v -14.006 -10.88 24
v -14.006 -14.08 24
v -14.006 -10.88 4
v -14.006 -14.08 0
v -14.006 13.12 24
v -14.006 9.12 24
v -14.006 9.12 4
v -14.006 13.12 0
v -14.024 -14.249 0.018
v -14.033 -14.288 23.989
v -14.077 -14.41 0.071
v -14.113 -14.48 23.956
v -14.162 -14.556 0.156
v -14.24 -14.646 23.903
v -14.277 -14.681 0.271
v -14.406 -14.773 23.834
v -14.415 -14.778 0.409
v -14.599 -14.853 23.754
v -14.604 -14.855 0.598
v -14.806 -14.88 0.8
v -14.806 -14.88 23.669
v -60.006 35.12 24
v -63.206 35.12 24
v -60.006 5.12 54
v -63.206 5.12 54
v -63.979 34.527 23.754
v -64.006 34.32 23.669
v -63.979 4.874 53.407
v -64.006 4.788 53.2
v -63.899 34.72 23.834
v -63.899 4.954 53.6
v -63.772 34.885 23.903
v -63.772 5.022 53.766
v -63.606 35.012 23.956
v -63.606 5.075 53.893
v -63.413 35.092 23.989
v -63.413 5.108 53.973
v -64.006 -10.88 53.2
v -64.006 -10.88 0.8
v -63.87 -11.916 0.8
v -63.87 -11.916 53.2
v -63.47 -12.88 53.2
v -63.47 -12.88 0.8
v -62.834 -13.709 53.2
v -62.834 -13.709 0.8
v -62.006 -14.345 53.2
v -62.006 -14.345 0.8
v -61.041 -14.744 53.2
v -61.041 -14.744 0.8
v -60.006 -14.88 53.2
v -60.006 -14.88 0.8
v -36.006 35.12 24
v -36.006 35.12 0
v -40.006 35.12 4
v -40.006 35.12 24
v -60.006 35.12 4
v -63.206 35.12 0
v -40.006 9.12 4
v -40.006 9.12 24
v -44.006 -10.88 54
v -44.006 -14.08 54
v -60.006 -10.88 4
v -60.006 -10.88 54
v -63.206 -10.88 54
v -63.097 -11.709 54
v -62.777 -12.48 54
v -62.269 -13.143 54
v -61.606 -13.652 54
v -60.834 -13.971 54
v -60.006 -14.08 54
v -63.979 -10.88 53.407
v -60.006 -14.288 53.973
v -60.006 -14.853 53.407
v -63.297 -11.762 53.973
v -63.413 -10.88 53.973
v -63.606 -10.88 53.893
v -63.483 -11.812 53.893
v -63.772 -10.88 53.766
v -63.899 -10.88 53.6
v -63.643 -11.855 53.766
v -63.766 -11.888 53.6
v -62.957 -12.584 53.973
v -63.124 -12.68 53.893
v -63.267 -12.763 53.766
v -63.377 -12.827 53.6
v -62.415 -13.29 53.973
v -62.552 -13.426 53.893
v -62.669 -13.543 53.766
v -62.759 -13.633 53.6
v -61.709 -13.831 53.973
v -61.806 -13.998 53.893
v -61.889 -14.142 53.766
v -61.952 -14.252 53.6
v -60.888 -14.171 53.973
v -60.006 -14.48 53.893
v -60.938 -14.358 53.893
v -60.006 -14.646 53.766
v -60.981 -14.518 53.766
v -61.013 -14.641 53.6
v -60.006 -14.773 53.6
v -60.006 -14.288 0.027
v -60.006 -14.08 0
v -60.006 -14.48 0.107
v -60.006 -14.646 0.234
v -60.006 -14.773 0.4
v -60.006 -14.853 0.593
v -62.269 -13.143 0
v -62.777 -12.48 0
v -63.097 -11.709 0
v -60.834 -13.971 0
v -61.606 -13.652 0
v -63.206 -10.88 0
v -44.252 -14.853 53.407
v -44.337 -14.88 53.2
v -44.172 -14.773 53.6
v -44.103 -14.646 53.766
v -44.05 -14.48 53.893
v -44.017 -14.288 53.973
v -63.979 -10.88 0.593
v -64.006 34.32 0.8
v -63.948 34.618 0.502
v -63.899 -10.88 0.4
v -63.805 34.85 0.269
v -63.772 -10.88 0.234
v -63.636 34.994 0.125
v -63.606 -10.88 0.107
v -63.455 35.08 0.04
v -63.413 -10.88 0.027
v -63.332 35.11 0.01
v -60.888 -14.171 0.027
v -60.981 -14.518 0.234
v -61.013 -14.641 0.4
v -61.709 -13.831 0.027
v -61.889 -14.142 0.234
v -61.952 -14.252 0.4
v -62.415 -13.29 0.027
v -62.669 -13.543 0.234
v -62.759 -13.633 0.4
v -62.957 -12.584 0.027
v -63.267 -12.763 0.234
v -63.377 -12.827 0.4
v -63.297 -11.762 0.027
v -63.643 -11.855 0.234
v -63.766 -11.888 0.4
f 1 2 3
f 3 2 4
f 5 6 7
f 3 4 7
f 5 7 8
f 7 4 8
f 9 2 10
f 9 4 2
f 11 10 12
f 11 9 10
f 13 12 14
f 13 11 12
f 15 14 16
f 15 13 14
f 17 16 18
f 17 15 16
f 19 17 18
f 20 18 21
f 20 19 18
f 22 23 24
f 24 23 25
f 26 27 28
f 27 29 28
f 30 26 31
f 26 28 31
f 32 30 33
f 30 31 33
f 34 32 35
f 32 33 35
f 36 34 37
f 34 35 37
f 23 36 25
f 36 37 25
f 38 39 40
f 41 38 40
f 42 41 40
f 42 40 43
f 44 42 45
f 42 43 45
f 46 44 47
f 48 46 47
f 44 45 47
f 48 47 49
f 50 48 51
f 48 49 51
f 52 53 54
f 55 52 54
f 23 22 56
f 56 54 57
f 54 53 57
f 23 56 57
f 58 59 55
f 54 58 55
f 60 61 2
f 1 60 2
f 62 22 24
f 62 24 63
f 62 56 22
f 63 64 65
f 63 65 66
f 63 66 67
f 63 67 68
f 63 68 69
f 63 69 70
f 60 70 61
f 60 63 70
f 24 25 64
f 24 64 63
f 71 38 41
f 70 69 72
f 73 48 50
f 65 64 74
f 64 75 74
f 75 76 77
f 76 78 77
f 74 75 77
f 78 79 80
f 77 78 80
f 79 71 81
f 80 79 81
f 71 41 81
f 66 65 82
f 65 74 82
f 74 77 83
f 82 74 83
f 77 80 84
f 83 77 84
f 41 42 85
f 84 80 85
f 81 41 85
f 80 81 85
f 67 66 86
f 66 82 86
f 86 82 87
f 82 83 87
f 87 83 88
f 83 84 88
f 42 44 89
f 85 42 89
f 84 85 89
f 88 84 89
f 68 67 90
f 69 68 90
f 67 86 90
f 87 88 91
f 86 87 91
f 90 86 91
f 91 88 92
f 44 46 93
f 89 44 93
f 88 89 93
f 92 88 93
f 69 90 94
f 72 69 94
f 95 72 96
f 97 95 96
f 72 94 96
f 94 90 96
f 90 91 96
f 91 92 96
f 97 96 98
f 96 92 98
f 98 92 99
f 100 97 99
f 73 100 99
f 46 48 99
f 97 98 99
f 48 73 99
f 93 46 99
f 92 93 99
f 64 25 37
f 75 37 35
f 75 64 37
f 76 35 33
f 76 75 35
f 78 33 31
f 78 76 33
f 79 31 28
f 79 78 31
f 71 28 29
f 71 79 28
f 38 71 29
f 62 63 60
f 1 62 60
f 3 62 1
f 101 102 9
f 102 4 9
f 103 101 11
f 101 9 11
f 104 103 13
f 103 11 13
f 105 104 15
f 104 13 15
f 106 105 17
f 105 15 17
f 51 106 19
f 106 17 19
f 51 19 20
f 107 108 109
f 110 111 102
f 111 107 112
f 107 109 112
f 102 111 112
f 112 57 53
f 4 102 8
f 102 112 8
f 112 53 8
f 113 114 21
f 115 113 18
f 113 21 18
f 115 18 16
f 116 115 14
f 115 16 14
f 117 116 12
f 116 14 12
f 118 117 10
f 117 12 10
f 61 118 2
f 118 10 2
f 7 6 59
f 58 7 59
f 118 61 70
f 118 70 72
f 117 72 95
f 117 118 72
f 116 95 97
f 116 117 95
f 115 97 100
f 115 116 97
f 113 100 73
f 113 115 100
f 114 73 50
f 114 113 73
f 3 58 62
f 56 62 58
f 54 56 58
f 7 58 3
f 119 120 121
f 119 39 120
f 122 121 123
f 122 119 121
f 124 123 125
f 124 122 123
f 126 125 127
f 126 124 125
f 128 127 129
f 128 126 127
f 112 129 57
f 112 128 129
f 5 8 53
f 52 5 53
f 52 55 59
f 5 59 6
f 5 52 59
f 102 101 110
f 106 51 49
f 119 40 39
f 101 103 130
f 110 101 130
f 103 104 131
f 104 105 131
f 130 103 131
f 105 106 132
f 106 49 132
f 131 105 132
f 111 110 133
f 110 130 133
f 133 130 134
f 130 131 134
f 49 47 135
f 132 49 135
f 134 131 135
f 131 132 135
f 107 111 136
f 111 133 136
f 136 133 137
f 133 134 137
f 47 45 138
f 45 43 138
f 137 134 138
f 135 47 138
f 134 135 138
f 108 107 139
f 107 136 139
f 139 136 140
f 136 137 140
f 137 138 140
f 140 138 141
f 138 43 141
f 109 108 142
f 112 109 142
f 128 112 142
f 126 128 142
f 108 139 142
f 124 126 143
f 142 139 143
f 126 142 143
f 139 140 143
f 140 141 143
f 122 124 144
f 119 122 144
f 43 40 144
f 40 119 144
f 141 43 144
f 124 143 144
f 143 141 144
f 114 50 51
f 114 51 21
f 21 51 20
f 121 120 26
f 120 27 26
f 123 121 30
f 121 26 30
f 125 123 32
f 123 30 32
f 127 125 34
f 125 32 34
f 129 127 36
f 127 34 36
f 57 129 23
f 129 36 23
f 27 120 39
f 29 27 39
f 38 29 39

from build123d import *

# Parameters (mm, degrees)
F1_DEPTH     = 24
F3_DEPTH     = 20
F4_DEPTH     = 30
F6_DEPTH     = 25
F8_DEPTH     = 25
F9_R         = 0.8
F10_T1_DEPTH = 54
F10_T4_ANGLE = 90
F10_T6_ANGLE = 90


# Not quite as in the source:
# - a fillet or chamfer that OpenCascade refuses, or shapes differently, is made with other operations: its cross-section is extruded or revolved along the edge and cut away or added


with BuildPart() as f1:
    # F0 (on Top) → F1 (new body)
    with BuildSketch(Plane.XY):
        Polygon((-36.005956176, 35.1195232451), (-64.005956176, 35.1195232451), (-64.005956176, -14.8804767549), (-14.005956176, -14.8804767549), (-14.005956176, 13.1195232451), align=None)
    extrude(amount=F1_DEPTH)

    # F2 (on face) → F3 (cut)
    with BuildSketch(Plane.XY.offset(24)):
        Polygon((-40.005956176, 35.1195232451), (-60.005956176, 35.1195232451), (-60.005956176, -10.8804767549), (-14.005956176, -10.8804767549), (-14.005956176, 9.1195232451), (-40.005956176, 9.1195232451), align=None)
    extrude(amount=-F3_DEPTH, mode=Mode.SUBTRACT)

    # F4 (add): a face of the model
    f4_faces = [f1.faces().sort_by_distance(p)[0] for p in [
        (-60.7130629571, 12.1195232451, 24),
    ]]
    extrude(f4_faces, amount=F4_DEPTH)

    # F5 (on face) → F6 (cut)
    with BuildSketch(Plane.XZ.offset(14.8804767549)):
        Polygon((-14.005956176, 24), (-14.005956176, 54), (-44.005956176, 54), align=None)
    extrude(amount=-F6_DEPTH, mode=Mode.SUBTRACT)

    # F7 (on face) → F8 (cut)
    with BuildSketch(Plane(origin=(-64.005956176, 0, 0), x_dir=(0, -1, 0), z_dir=(-1, 0, 0))):
        Polygon((-5.1195232451, 54), (-35.1195232451, 54), (-35.1195232451, 24), align=None)
    extrude(amount=-F8_DEPTH, mode=Mode.SUBTRACT)

    # F9
    f9_edges = [f1.edges().sort_by_distance(p)[0] for p in [
        (-64.005956, -4.880477, 54),
        (-54.005956, -14.880477, 54),
        (-64.005956, 20.119523, 39),
        (-29.005956, -14.880477, 39),
        (-64.005956, 35.119523, 12),
        (-14.005956, -14.880477, 12),
        (-64.005956, 10.119523, 0),
        (-39.005956, -14.880477, 0),
    ]]
    fillet(f9_edges, radius=F9_R)

    # F10: fillet of radius 4 on 1 edges, made by hand

    # F10_s2 → F10_t1 (cut)
    with BuildSketch(Plane.XY):
        with BuildLine():
            ThreePointArc((-64.005956176, -10.8804767549), (-62.8343833007, -13.7089038797), (-60.005956176, -14.8804767549))
            Line((-60.005956176, -14.8804767549), (-64.005956176, -14.8804767549))
            Line((-64.005956176, -14.8804767549), (-64.005956176, -10.8804767549))
        make_face()
    extrude(amount=F10_T1_DEPTH, mode=Mode.SUBTRACT)

    # F10_s3 → F10_t4 (revolve, cut)
    with BuildSketch(Plane.YZ.offset(-60.005956176)):
        with BuildLine():
            ThreePointArc((-14.0804767549, 0), (-14.6461621799, 0.2343145751), (-14.8804767549, 0.8))
            Line((-14.8804767549, 0.8), (-14.8804767549, 0))
            Line((-14.8804767549, 0), (-14.0804767549, 0))
        make_face()
    revolve(axis=Axis((-60.005956176, -10.8804767549, 0), (0, 0, -1)), revolution_arc=F10_T4_ANGLE, mode=Mode.SUBTRACT)

    # F10_s5 → F10_t6 (revolve, cut)
    with BuildSketch(Plane.XZ.offset(10.8804767549)):
        with BuildLine():
            ThreePointArc((-63.205956176, 54), (-63.7716416009, 53.7656854249), (-64.005956176, 53.2))
            Line((-64.005956176, 53.2), (-64.005956176, 54))
            Line((-64.005956176, 54), (-63.205956176, 54))
        make_face()
    revolve(axis=Axis((-60.005956176, -10.8804767549, 54), (0, 0, 1)), revolution_arc=F10_T6_ANGLE, mode=Mode.SUBTRACT)


solid = f1.part
